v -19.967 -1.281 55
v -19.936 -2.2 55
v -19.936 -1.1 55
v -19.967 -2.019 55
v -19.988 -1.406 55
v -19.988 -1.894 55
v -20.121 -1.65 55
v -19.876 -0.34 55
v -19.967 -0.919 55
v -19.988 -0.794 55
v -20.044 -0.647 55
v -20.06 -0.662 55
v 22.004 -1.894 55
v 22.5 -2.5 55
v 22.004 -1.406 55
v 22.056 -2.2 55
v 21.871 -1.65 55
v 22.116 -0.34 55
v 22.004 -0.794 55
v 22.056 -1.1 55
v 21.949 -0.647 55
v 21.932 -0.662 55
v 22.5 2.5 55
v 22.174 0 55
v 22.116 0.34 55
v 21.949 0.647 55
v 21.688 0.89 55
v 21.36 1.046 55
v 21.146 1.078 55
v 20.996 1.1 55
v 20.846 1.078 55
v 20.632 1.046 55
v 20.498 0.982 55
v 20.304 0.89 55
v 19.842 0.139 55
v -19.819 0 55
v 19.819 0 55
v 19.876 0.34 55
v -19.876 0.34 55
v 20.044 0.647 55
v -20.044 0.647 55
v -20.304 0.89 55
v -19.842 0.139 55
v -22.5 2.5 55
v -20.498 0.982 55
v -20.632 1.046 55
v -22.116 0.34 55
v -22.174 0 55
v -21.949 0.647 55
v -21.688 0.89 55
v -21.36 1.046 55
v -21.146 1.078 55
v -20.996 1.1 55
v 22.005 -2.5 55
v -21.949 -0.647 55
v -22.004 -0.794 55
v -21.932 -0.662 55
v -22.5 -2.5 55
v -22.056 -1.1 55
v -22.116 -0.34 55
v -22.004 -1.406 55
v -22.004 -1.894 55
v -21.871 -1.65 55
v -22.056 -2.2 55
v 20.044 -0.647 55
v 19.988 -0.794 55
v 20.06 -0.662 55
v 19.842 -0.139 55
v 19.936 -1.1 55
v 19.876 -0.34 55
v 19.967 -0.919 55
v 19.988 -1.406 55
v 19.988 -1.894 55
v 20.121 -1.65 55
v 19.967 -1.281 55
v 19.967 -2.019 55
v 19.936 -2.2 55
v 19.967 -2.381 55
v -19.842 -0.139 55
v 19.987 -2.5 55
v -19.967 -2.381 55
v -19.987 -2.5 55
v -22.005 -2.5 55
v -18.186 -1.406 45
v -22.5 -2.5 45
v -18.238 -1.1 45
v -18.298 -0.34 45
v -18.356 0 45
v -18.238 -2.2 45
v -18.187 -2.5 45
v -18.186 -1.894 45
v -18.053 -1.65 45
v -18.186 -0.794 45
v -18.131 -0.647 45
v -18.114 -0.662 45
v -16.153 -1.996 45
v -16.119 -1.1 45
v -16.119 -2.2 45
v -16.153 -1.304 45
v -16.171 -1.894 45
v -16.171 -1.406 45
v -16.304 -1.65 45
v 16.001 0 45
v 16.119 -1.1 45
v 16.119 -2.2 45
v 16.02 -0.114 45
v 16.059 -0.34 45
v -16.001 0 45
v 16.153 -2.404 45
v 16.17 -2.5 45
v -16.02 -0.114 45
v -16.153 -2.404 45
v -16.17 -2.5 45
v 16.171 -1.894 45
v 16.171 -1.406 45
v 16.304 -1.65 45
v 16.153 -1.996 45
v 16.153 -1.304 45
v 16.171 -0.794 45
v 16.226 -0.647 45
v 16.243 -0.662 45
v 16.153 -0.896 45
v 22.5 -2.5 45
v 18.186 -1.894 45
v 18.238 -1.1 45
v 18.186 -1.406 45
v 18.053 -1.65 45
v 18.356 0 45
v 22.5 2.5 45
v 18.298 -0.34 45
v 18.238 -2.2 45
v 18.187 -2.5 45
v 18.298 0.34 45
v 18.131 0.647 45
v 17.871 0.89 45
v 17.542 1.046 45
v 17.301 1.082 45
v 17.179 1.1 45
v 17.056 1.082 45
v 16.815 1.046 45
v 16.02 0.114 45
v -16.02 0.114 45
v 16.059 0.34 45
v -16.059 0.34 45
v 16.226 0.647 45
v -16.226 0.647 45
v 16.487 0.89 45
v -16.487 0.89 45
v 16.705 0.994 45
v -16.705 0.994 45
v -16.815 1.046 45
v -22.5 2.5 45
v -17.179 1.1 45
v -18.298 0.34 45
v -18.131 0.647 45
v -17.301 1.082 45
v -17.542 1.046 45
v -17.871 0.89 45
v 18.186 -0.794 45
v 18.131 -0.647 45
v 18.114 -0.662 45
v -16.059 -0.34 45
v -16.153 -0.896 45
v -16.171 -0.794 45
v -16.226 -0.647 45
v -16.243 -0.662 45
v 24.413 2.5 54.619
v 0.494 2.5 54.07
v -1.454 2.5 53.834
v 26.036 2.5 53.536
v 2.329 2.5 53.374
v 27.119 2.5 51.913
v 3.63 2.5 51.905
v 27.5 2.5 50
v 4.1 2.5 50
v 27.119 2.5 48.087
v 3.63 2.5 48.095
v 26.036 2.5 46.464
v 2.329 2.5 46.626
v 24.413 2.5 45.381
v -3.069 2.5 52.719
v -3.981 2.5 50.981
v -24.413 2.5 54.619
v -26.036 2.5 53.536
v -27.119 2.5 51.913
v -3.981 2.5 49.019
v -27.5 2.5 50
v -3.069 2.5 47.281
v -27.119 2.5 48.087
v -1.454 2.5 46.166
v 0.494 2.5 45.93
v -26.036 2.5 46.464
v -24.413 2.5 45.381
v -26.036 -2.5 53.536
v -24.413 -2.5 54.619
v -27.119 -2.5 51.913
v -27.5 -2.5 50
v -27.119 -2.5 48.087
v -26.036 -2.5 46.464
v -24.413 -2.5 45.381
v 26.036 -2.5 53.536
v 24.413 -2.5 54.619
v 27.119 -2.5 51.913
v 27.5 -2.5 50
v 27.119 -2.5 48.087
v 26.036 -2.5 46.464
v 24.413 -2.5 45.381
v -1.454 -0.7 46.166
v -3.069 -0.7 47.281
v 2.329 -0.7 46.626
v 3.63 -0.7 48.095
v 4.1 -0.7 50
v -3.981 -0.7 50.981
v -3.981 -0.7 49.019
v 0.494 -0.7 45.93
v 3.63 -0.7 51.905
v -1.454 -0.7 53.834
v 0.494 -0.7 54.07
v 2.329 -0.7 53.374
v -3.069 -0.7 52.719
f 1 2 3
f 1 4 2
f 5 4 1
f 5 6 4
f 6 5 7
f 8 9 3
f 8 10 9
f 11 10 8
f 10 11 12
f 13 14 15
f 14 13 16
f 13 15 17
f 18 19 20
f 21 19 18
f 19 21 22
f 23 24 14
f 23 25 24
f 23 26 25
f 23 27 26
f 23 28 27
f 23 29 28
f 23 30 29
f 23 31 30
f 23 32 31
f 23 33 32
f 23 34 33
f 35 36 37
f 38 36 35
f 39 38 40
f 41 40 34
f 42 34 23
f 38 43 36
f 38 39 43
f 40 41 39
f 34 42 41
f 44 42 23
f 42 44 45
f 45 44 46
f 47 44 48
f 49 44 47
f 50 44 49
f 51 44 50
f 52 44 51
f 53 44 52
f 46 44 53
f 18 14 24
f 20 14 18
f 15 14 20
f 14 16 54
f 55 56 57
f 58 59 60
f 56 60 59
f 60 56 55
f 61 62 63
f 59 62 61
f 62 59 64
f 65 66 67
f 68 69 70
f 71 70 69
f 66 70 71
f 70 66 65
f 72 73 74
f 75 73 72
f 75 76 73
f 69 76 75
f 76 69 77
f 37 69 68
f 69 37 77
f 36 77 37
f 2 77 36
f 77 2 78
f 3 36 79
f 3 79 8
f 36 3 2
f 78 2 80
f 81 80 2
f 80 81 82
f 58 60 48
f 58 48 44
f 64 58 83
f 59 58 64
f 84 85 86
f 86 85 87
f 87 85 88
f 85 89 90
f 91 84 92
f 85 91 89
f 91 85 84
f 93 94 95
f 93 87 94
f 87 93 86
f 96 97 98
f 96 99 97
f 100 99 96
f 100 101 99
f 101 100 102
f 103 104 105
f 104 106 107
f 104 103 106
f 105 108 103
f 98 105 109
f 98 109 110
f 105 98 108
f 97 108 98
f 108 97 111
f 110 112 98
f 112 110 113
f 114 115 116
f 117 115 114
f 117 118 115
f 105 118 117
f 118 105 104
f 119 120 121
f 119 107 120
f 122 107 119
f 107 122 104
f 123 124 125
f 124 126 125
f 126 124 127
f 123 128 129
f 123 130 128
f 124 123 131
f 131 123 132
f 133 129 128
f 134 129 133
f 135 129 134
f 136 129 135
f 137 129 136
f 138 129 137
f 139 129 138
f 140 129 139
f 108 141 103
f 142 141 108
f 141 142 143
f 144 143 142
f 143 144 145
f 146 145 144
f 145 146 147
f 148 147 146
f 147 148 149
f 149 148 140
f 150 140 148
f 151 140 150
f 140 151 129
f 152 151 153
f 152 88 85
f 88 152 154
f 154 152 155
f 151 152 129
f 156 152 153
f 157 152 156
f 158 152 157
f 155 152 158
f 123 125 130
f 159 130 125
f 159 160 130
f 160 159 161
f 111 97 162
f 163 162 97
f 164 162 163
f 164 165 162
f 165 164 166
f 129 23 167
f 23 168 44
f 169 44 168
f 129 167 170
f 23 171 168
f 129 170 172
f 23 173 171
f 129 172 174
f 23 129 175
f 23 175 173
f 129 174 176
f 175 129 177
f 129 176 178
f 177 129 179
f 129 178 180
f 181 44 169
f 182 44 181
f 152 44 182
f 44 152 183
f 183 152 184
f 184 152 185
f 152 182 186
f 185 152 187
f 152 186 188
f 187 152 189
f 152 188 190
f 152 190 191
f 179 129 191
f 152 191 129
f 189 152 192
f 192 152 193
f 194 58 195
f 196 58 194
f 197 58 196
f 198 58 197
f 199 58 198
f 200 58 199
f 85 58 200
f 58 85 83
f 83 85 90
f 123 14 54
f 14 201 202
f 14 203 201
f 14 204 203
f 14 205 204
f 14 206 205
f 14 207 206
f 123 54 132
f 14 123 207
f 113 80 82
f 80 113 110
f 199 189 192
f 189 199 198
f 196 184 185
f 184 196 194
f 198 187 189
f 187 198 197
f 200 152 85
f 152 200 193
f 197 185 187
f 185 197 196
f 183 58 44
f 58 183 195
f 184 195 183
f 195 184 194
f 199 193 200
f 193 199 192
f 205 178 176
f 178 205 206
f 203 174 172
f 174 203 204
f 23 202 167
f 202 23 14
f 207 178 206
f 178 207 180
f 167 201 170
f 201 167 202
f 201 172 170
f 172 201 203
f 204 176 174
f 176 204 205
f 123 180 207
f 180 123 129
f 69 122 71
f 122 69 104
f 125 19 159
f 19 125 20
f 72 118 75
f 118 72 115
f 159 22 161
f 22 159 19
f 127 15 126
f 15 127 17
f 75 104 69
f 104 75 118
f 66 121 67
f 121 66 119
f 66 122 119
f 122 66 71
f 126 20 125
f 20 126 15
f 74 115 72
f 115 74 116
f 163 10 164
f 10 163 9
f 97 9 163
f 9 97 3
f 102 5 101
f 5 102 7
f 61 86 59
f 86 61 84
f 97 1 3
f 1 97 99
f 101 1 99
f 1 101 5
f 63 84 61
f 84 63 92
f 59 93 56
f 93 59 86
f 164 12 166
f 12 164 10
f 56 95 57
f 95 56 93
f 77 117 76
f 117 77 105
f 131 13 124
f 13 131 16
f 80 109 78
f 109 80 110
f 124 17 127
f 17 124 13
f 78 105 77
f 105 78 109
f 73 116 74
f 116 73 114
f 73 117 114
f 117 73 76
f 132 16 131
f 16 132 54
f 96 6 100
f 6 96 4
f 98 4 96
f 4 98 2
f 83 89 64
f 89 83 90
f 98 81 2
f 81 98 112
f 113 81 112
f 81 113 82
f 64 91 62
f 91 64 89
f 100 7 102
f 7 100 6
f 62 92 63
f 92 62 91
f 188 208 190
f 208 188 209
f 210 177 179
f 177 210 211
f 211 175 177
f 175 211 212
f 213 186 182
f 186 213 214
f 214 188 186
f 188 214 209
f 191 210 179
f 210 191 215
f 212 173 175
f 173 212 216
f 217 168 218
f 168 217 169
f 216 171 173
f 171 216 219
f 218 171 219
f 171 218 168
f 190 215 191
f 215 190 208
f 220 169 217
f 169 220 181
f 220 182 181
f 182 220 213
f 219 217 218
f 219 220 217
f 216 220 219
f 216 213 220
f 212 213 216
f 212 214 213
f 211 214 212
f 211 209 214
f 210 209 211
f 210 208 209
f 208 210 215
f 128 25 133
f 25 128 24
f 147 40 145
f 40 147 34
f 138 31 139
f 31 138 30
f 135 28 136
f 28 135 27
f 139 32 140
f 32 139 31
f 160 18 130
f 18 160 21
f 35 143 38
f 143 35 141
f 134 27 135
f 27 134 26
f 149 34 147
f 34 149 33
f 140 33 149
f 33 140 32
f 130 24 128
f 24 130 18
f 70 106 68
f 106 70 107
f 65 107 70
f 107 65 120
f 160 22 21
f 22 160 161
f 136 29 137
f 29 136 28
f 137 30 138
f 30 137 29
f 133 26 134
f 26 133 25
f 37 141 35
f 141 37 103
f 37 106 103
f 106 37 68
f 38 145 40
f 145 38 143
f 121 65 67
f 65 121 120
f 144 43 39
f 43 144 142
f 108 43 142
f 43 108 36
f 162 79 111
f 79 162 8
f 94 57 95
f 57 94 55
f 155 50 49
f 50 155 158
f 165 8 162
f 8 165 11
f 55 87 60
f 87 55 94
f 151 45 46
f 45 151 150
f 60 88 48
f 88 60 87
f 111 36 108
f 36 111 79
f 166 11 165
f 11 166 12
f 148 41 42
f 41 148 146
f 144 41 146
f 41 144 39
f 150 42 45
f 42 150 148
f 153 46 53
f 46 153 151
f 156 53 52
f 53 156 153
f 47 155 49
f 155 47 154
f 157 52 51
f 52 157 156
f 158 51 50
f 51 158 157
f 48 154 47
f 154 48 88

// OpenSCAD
szprycha_srednica = 2.2;
szprycha_dlugosc = 143;
szprychy_odstep = 102;
kat = acos((2*szprycha_dlugosc*szprycha_dlugosc-szprychy_odstep*szprychy_odstep)/(2*szprycha_dlugosc*szprycha_dlugosc));

uchwyt_dlugosc = 45;
uchwyt_szerokosc = 10;
uchwyt_grubosc = 5;
uchwyt_wysokosc = 50;
magnes_h = 3;
magnes_d = 8;

difference(){
    union(){
        translate([0,0,uchwyt_wysokosc]){
            cube([uchwyt_dlugosc,uchwyt_grubosc,uchwyt_szerokosc],center=true);
            translate([-uchwyt_dlugosc/2,0,0]){
            rotate([90,0,0]){
                cylinder(h=uchwyt_grubosc, d=uchwyt_szerokosc, center=true);
            }
        }
                    translate([uchwyt_dlugosc/2,0,0]){
            rotate([90,0,0]){
                cylinder(h=uchwyt_grubosc, d=uchwyt_szerokosc, center=true);
            }
        }
        }
    }
    
    translate([0,uchwyt_grubosc/2-magnes_h-0.2,uchwyt_wysokosc])
    {
        rotate([-90,0,0]){
            #cylinder(h = 10, d=magnes_d+0.2);
        }
    }
    
    
    rotate([0,kat/2,0]){
    #cylinder(h= szprycha_dlugosc, d=szprycha_srednica, center = false, $fn=20);
    }
    rotate([0,-kat/2,0]){
    translate([0,0,0]){
        #cylinder(h= szprycha_dlugosc, d=szprycha_srednica, center = false, $fn=20);
    }
    }
    
    translate([0, -szprycha_srednica*0.5,0]){
    rotate([0,kat/2,0]){
    #cylinder(h= szprycha_dlugosc, d=szprycha_srednica*0.9, center = false, $fn=20);
    }
    rotate([0,-kat/2,0]){
    translate([0,0,0]){
        #cylinder(h= szprycha_dlugosc, d=szprycha_srednica*0.9, center = false, $fn=20);
    }
    }
    }
        translate([0, -szprycha_srednica,0]){
    rotate([0,kat/2,0]){
    #cylinder(h= szprycha_dlugosc, d=szprycha_srednica*0.9, center = false, $fn=20);
    }
    rotate([0,-kat/2,0]){
    translate([0,0,0]){
        #cylinder(h= szprycha_dlugosc, d=szprycha_srednica*0.9, center = false, $fn=20);
    }
    }
    }
}
